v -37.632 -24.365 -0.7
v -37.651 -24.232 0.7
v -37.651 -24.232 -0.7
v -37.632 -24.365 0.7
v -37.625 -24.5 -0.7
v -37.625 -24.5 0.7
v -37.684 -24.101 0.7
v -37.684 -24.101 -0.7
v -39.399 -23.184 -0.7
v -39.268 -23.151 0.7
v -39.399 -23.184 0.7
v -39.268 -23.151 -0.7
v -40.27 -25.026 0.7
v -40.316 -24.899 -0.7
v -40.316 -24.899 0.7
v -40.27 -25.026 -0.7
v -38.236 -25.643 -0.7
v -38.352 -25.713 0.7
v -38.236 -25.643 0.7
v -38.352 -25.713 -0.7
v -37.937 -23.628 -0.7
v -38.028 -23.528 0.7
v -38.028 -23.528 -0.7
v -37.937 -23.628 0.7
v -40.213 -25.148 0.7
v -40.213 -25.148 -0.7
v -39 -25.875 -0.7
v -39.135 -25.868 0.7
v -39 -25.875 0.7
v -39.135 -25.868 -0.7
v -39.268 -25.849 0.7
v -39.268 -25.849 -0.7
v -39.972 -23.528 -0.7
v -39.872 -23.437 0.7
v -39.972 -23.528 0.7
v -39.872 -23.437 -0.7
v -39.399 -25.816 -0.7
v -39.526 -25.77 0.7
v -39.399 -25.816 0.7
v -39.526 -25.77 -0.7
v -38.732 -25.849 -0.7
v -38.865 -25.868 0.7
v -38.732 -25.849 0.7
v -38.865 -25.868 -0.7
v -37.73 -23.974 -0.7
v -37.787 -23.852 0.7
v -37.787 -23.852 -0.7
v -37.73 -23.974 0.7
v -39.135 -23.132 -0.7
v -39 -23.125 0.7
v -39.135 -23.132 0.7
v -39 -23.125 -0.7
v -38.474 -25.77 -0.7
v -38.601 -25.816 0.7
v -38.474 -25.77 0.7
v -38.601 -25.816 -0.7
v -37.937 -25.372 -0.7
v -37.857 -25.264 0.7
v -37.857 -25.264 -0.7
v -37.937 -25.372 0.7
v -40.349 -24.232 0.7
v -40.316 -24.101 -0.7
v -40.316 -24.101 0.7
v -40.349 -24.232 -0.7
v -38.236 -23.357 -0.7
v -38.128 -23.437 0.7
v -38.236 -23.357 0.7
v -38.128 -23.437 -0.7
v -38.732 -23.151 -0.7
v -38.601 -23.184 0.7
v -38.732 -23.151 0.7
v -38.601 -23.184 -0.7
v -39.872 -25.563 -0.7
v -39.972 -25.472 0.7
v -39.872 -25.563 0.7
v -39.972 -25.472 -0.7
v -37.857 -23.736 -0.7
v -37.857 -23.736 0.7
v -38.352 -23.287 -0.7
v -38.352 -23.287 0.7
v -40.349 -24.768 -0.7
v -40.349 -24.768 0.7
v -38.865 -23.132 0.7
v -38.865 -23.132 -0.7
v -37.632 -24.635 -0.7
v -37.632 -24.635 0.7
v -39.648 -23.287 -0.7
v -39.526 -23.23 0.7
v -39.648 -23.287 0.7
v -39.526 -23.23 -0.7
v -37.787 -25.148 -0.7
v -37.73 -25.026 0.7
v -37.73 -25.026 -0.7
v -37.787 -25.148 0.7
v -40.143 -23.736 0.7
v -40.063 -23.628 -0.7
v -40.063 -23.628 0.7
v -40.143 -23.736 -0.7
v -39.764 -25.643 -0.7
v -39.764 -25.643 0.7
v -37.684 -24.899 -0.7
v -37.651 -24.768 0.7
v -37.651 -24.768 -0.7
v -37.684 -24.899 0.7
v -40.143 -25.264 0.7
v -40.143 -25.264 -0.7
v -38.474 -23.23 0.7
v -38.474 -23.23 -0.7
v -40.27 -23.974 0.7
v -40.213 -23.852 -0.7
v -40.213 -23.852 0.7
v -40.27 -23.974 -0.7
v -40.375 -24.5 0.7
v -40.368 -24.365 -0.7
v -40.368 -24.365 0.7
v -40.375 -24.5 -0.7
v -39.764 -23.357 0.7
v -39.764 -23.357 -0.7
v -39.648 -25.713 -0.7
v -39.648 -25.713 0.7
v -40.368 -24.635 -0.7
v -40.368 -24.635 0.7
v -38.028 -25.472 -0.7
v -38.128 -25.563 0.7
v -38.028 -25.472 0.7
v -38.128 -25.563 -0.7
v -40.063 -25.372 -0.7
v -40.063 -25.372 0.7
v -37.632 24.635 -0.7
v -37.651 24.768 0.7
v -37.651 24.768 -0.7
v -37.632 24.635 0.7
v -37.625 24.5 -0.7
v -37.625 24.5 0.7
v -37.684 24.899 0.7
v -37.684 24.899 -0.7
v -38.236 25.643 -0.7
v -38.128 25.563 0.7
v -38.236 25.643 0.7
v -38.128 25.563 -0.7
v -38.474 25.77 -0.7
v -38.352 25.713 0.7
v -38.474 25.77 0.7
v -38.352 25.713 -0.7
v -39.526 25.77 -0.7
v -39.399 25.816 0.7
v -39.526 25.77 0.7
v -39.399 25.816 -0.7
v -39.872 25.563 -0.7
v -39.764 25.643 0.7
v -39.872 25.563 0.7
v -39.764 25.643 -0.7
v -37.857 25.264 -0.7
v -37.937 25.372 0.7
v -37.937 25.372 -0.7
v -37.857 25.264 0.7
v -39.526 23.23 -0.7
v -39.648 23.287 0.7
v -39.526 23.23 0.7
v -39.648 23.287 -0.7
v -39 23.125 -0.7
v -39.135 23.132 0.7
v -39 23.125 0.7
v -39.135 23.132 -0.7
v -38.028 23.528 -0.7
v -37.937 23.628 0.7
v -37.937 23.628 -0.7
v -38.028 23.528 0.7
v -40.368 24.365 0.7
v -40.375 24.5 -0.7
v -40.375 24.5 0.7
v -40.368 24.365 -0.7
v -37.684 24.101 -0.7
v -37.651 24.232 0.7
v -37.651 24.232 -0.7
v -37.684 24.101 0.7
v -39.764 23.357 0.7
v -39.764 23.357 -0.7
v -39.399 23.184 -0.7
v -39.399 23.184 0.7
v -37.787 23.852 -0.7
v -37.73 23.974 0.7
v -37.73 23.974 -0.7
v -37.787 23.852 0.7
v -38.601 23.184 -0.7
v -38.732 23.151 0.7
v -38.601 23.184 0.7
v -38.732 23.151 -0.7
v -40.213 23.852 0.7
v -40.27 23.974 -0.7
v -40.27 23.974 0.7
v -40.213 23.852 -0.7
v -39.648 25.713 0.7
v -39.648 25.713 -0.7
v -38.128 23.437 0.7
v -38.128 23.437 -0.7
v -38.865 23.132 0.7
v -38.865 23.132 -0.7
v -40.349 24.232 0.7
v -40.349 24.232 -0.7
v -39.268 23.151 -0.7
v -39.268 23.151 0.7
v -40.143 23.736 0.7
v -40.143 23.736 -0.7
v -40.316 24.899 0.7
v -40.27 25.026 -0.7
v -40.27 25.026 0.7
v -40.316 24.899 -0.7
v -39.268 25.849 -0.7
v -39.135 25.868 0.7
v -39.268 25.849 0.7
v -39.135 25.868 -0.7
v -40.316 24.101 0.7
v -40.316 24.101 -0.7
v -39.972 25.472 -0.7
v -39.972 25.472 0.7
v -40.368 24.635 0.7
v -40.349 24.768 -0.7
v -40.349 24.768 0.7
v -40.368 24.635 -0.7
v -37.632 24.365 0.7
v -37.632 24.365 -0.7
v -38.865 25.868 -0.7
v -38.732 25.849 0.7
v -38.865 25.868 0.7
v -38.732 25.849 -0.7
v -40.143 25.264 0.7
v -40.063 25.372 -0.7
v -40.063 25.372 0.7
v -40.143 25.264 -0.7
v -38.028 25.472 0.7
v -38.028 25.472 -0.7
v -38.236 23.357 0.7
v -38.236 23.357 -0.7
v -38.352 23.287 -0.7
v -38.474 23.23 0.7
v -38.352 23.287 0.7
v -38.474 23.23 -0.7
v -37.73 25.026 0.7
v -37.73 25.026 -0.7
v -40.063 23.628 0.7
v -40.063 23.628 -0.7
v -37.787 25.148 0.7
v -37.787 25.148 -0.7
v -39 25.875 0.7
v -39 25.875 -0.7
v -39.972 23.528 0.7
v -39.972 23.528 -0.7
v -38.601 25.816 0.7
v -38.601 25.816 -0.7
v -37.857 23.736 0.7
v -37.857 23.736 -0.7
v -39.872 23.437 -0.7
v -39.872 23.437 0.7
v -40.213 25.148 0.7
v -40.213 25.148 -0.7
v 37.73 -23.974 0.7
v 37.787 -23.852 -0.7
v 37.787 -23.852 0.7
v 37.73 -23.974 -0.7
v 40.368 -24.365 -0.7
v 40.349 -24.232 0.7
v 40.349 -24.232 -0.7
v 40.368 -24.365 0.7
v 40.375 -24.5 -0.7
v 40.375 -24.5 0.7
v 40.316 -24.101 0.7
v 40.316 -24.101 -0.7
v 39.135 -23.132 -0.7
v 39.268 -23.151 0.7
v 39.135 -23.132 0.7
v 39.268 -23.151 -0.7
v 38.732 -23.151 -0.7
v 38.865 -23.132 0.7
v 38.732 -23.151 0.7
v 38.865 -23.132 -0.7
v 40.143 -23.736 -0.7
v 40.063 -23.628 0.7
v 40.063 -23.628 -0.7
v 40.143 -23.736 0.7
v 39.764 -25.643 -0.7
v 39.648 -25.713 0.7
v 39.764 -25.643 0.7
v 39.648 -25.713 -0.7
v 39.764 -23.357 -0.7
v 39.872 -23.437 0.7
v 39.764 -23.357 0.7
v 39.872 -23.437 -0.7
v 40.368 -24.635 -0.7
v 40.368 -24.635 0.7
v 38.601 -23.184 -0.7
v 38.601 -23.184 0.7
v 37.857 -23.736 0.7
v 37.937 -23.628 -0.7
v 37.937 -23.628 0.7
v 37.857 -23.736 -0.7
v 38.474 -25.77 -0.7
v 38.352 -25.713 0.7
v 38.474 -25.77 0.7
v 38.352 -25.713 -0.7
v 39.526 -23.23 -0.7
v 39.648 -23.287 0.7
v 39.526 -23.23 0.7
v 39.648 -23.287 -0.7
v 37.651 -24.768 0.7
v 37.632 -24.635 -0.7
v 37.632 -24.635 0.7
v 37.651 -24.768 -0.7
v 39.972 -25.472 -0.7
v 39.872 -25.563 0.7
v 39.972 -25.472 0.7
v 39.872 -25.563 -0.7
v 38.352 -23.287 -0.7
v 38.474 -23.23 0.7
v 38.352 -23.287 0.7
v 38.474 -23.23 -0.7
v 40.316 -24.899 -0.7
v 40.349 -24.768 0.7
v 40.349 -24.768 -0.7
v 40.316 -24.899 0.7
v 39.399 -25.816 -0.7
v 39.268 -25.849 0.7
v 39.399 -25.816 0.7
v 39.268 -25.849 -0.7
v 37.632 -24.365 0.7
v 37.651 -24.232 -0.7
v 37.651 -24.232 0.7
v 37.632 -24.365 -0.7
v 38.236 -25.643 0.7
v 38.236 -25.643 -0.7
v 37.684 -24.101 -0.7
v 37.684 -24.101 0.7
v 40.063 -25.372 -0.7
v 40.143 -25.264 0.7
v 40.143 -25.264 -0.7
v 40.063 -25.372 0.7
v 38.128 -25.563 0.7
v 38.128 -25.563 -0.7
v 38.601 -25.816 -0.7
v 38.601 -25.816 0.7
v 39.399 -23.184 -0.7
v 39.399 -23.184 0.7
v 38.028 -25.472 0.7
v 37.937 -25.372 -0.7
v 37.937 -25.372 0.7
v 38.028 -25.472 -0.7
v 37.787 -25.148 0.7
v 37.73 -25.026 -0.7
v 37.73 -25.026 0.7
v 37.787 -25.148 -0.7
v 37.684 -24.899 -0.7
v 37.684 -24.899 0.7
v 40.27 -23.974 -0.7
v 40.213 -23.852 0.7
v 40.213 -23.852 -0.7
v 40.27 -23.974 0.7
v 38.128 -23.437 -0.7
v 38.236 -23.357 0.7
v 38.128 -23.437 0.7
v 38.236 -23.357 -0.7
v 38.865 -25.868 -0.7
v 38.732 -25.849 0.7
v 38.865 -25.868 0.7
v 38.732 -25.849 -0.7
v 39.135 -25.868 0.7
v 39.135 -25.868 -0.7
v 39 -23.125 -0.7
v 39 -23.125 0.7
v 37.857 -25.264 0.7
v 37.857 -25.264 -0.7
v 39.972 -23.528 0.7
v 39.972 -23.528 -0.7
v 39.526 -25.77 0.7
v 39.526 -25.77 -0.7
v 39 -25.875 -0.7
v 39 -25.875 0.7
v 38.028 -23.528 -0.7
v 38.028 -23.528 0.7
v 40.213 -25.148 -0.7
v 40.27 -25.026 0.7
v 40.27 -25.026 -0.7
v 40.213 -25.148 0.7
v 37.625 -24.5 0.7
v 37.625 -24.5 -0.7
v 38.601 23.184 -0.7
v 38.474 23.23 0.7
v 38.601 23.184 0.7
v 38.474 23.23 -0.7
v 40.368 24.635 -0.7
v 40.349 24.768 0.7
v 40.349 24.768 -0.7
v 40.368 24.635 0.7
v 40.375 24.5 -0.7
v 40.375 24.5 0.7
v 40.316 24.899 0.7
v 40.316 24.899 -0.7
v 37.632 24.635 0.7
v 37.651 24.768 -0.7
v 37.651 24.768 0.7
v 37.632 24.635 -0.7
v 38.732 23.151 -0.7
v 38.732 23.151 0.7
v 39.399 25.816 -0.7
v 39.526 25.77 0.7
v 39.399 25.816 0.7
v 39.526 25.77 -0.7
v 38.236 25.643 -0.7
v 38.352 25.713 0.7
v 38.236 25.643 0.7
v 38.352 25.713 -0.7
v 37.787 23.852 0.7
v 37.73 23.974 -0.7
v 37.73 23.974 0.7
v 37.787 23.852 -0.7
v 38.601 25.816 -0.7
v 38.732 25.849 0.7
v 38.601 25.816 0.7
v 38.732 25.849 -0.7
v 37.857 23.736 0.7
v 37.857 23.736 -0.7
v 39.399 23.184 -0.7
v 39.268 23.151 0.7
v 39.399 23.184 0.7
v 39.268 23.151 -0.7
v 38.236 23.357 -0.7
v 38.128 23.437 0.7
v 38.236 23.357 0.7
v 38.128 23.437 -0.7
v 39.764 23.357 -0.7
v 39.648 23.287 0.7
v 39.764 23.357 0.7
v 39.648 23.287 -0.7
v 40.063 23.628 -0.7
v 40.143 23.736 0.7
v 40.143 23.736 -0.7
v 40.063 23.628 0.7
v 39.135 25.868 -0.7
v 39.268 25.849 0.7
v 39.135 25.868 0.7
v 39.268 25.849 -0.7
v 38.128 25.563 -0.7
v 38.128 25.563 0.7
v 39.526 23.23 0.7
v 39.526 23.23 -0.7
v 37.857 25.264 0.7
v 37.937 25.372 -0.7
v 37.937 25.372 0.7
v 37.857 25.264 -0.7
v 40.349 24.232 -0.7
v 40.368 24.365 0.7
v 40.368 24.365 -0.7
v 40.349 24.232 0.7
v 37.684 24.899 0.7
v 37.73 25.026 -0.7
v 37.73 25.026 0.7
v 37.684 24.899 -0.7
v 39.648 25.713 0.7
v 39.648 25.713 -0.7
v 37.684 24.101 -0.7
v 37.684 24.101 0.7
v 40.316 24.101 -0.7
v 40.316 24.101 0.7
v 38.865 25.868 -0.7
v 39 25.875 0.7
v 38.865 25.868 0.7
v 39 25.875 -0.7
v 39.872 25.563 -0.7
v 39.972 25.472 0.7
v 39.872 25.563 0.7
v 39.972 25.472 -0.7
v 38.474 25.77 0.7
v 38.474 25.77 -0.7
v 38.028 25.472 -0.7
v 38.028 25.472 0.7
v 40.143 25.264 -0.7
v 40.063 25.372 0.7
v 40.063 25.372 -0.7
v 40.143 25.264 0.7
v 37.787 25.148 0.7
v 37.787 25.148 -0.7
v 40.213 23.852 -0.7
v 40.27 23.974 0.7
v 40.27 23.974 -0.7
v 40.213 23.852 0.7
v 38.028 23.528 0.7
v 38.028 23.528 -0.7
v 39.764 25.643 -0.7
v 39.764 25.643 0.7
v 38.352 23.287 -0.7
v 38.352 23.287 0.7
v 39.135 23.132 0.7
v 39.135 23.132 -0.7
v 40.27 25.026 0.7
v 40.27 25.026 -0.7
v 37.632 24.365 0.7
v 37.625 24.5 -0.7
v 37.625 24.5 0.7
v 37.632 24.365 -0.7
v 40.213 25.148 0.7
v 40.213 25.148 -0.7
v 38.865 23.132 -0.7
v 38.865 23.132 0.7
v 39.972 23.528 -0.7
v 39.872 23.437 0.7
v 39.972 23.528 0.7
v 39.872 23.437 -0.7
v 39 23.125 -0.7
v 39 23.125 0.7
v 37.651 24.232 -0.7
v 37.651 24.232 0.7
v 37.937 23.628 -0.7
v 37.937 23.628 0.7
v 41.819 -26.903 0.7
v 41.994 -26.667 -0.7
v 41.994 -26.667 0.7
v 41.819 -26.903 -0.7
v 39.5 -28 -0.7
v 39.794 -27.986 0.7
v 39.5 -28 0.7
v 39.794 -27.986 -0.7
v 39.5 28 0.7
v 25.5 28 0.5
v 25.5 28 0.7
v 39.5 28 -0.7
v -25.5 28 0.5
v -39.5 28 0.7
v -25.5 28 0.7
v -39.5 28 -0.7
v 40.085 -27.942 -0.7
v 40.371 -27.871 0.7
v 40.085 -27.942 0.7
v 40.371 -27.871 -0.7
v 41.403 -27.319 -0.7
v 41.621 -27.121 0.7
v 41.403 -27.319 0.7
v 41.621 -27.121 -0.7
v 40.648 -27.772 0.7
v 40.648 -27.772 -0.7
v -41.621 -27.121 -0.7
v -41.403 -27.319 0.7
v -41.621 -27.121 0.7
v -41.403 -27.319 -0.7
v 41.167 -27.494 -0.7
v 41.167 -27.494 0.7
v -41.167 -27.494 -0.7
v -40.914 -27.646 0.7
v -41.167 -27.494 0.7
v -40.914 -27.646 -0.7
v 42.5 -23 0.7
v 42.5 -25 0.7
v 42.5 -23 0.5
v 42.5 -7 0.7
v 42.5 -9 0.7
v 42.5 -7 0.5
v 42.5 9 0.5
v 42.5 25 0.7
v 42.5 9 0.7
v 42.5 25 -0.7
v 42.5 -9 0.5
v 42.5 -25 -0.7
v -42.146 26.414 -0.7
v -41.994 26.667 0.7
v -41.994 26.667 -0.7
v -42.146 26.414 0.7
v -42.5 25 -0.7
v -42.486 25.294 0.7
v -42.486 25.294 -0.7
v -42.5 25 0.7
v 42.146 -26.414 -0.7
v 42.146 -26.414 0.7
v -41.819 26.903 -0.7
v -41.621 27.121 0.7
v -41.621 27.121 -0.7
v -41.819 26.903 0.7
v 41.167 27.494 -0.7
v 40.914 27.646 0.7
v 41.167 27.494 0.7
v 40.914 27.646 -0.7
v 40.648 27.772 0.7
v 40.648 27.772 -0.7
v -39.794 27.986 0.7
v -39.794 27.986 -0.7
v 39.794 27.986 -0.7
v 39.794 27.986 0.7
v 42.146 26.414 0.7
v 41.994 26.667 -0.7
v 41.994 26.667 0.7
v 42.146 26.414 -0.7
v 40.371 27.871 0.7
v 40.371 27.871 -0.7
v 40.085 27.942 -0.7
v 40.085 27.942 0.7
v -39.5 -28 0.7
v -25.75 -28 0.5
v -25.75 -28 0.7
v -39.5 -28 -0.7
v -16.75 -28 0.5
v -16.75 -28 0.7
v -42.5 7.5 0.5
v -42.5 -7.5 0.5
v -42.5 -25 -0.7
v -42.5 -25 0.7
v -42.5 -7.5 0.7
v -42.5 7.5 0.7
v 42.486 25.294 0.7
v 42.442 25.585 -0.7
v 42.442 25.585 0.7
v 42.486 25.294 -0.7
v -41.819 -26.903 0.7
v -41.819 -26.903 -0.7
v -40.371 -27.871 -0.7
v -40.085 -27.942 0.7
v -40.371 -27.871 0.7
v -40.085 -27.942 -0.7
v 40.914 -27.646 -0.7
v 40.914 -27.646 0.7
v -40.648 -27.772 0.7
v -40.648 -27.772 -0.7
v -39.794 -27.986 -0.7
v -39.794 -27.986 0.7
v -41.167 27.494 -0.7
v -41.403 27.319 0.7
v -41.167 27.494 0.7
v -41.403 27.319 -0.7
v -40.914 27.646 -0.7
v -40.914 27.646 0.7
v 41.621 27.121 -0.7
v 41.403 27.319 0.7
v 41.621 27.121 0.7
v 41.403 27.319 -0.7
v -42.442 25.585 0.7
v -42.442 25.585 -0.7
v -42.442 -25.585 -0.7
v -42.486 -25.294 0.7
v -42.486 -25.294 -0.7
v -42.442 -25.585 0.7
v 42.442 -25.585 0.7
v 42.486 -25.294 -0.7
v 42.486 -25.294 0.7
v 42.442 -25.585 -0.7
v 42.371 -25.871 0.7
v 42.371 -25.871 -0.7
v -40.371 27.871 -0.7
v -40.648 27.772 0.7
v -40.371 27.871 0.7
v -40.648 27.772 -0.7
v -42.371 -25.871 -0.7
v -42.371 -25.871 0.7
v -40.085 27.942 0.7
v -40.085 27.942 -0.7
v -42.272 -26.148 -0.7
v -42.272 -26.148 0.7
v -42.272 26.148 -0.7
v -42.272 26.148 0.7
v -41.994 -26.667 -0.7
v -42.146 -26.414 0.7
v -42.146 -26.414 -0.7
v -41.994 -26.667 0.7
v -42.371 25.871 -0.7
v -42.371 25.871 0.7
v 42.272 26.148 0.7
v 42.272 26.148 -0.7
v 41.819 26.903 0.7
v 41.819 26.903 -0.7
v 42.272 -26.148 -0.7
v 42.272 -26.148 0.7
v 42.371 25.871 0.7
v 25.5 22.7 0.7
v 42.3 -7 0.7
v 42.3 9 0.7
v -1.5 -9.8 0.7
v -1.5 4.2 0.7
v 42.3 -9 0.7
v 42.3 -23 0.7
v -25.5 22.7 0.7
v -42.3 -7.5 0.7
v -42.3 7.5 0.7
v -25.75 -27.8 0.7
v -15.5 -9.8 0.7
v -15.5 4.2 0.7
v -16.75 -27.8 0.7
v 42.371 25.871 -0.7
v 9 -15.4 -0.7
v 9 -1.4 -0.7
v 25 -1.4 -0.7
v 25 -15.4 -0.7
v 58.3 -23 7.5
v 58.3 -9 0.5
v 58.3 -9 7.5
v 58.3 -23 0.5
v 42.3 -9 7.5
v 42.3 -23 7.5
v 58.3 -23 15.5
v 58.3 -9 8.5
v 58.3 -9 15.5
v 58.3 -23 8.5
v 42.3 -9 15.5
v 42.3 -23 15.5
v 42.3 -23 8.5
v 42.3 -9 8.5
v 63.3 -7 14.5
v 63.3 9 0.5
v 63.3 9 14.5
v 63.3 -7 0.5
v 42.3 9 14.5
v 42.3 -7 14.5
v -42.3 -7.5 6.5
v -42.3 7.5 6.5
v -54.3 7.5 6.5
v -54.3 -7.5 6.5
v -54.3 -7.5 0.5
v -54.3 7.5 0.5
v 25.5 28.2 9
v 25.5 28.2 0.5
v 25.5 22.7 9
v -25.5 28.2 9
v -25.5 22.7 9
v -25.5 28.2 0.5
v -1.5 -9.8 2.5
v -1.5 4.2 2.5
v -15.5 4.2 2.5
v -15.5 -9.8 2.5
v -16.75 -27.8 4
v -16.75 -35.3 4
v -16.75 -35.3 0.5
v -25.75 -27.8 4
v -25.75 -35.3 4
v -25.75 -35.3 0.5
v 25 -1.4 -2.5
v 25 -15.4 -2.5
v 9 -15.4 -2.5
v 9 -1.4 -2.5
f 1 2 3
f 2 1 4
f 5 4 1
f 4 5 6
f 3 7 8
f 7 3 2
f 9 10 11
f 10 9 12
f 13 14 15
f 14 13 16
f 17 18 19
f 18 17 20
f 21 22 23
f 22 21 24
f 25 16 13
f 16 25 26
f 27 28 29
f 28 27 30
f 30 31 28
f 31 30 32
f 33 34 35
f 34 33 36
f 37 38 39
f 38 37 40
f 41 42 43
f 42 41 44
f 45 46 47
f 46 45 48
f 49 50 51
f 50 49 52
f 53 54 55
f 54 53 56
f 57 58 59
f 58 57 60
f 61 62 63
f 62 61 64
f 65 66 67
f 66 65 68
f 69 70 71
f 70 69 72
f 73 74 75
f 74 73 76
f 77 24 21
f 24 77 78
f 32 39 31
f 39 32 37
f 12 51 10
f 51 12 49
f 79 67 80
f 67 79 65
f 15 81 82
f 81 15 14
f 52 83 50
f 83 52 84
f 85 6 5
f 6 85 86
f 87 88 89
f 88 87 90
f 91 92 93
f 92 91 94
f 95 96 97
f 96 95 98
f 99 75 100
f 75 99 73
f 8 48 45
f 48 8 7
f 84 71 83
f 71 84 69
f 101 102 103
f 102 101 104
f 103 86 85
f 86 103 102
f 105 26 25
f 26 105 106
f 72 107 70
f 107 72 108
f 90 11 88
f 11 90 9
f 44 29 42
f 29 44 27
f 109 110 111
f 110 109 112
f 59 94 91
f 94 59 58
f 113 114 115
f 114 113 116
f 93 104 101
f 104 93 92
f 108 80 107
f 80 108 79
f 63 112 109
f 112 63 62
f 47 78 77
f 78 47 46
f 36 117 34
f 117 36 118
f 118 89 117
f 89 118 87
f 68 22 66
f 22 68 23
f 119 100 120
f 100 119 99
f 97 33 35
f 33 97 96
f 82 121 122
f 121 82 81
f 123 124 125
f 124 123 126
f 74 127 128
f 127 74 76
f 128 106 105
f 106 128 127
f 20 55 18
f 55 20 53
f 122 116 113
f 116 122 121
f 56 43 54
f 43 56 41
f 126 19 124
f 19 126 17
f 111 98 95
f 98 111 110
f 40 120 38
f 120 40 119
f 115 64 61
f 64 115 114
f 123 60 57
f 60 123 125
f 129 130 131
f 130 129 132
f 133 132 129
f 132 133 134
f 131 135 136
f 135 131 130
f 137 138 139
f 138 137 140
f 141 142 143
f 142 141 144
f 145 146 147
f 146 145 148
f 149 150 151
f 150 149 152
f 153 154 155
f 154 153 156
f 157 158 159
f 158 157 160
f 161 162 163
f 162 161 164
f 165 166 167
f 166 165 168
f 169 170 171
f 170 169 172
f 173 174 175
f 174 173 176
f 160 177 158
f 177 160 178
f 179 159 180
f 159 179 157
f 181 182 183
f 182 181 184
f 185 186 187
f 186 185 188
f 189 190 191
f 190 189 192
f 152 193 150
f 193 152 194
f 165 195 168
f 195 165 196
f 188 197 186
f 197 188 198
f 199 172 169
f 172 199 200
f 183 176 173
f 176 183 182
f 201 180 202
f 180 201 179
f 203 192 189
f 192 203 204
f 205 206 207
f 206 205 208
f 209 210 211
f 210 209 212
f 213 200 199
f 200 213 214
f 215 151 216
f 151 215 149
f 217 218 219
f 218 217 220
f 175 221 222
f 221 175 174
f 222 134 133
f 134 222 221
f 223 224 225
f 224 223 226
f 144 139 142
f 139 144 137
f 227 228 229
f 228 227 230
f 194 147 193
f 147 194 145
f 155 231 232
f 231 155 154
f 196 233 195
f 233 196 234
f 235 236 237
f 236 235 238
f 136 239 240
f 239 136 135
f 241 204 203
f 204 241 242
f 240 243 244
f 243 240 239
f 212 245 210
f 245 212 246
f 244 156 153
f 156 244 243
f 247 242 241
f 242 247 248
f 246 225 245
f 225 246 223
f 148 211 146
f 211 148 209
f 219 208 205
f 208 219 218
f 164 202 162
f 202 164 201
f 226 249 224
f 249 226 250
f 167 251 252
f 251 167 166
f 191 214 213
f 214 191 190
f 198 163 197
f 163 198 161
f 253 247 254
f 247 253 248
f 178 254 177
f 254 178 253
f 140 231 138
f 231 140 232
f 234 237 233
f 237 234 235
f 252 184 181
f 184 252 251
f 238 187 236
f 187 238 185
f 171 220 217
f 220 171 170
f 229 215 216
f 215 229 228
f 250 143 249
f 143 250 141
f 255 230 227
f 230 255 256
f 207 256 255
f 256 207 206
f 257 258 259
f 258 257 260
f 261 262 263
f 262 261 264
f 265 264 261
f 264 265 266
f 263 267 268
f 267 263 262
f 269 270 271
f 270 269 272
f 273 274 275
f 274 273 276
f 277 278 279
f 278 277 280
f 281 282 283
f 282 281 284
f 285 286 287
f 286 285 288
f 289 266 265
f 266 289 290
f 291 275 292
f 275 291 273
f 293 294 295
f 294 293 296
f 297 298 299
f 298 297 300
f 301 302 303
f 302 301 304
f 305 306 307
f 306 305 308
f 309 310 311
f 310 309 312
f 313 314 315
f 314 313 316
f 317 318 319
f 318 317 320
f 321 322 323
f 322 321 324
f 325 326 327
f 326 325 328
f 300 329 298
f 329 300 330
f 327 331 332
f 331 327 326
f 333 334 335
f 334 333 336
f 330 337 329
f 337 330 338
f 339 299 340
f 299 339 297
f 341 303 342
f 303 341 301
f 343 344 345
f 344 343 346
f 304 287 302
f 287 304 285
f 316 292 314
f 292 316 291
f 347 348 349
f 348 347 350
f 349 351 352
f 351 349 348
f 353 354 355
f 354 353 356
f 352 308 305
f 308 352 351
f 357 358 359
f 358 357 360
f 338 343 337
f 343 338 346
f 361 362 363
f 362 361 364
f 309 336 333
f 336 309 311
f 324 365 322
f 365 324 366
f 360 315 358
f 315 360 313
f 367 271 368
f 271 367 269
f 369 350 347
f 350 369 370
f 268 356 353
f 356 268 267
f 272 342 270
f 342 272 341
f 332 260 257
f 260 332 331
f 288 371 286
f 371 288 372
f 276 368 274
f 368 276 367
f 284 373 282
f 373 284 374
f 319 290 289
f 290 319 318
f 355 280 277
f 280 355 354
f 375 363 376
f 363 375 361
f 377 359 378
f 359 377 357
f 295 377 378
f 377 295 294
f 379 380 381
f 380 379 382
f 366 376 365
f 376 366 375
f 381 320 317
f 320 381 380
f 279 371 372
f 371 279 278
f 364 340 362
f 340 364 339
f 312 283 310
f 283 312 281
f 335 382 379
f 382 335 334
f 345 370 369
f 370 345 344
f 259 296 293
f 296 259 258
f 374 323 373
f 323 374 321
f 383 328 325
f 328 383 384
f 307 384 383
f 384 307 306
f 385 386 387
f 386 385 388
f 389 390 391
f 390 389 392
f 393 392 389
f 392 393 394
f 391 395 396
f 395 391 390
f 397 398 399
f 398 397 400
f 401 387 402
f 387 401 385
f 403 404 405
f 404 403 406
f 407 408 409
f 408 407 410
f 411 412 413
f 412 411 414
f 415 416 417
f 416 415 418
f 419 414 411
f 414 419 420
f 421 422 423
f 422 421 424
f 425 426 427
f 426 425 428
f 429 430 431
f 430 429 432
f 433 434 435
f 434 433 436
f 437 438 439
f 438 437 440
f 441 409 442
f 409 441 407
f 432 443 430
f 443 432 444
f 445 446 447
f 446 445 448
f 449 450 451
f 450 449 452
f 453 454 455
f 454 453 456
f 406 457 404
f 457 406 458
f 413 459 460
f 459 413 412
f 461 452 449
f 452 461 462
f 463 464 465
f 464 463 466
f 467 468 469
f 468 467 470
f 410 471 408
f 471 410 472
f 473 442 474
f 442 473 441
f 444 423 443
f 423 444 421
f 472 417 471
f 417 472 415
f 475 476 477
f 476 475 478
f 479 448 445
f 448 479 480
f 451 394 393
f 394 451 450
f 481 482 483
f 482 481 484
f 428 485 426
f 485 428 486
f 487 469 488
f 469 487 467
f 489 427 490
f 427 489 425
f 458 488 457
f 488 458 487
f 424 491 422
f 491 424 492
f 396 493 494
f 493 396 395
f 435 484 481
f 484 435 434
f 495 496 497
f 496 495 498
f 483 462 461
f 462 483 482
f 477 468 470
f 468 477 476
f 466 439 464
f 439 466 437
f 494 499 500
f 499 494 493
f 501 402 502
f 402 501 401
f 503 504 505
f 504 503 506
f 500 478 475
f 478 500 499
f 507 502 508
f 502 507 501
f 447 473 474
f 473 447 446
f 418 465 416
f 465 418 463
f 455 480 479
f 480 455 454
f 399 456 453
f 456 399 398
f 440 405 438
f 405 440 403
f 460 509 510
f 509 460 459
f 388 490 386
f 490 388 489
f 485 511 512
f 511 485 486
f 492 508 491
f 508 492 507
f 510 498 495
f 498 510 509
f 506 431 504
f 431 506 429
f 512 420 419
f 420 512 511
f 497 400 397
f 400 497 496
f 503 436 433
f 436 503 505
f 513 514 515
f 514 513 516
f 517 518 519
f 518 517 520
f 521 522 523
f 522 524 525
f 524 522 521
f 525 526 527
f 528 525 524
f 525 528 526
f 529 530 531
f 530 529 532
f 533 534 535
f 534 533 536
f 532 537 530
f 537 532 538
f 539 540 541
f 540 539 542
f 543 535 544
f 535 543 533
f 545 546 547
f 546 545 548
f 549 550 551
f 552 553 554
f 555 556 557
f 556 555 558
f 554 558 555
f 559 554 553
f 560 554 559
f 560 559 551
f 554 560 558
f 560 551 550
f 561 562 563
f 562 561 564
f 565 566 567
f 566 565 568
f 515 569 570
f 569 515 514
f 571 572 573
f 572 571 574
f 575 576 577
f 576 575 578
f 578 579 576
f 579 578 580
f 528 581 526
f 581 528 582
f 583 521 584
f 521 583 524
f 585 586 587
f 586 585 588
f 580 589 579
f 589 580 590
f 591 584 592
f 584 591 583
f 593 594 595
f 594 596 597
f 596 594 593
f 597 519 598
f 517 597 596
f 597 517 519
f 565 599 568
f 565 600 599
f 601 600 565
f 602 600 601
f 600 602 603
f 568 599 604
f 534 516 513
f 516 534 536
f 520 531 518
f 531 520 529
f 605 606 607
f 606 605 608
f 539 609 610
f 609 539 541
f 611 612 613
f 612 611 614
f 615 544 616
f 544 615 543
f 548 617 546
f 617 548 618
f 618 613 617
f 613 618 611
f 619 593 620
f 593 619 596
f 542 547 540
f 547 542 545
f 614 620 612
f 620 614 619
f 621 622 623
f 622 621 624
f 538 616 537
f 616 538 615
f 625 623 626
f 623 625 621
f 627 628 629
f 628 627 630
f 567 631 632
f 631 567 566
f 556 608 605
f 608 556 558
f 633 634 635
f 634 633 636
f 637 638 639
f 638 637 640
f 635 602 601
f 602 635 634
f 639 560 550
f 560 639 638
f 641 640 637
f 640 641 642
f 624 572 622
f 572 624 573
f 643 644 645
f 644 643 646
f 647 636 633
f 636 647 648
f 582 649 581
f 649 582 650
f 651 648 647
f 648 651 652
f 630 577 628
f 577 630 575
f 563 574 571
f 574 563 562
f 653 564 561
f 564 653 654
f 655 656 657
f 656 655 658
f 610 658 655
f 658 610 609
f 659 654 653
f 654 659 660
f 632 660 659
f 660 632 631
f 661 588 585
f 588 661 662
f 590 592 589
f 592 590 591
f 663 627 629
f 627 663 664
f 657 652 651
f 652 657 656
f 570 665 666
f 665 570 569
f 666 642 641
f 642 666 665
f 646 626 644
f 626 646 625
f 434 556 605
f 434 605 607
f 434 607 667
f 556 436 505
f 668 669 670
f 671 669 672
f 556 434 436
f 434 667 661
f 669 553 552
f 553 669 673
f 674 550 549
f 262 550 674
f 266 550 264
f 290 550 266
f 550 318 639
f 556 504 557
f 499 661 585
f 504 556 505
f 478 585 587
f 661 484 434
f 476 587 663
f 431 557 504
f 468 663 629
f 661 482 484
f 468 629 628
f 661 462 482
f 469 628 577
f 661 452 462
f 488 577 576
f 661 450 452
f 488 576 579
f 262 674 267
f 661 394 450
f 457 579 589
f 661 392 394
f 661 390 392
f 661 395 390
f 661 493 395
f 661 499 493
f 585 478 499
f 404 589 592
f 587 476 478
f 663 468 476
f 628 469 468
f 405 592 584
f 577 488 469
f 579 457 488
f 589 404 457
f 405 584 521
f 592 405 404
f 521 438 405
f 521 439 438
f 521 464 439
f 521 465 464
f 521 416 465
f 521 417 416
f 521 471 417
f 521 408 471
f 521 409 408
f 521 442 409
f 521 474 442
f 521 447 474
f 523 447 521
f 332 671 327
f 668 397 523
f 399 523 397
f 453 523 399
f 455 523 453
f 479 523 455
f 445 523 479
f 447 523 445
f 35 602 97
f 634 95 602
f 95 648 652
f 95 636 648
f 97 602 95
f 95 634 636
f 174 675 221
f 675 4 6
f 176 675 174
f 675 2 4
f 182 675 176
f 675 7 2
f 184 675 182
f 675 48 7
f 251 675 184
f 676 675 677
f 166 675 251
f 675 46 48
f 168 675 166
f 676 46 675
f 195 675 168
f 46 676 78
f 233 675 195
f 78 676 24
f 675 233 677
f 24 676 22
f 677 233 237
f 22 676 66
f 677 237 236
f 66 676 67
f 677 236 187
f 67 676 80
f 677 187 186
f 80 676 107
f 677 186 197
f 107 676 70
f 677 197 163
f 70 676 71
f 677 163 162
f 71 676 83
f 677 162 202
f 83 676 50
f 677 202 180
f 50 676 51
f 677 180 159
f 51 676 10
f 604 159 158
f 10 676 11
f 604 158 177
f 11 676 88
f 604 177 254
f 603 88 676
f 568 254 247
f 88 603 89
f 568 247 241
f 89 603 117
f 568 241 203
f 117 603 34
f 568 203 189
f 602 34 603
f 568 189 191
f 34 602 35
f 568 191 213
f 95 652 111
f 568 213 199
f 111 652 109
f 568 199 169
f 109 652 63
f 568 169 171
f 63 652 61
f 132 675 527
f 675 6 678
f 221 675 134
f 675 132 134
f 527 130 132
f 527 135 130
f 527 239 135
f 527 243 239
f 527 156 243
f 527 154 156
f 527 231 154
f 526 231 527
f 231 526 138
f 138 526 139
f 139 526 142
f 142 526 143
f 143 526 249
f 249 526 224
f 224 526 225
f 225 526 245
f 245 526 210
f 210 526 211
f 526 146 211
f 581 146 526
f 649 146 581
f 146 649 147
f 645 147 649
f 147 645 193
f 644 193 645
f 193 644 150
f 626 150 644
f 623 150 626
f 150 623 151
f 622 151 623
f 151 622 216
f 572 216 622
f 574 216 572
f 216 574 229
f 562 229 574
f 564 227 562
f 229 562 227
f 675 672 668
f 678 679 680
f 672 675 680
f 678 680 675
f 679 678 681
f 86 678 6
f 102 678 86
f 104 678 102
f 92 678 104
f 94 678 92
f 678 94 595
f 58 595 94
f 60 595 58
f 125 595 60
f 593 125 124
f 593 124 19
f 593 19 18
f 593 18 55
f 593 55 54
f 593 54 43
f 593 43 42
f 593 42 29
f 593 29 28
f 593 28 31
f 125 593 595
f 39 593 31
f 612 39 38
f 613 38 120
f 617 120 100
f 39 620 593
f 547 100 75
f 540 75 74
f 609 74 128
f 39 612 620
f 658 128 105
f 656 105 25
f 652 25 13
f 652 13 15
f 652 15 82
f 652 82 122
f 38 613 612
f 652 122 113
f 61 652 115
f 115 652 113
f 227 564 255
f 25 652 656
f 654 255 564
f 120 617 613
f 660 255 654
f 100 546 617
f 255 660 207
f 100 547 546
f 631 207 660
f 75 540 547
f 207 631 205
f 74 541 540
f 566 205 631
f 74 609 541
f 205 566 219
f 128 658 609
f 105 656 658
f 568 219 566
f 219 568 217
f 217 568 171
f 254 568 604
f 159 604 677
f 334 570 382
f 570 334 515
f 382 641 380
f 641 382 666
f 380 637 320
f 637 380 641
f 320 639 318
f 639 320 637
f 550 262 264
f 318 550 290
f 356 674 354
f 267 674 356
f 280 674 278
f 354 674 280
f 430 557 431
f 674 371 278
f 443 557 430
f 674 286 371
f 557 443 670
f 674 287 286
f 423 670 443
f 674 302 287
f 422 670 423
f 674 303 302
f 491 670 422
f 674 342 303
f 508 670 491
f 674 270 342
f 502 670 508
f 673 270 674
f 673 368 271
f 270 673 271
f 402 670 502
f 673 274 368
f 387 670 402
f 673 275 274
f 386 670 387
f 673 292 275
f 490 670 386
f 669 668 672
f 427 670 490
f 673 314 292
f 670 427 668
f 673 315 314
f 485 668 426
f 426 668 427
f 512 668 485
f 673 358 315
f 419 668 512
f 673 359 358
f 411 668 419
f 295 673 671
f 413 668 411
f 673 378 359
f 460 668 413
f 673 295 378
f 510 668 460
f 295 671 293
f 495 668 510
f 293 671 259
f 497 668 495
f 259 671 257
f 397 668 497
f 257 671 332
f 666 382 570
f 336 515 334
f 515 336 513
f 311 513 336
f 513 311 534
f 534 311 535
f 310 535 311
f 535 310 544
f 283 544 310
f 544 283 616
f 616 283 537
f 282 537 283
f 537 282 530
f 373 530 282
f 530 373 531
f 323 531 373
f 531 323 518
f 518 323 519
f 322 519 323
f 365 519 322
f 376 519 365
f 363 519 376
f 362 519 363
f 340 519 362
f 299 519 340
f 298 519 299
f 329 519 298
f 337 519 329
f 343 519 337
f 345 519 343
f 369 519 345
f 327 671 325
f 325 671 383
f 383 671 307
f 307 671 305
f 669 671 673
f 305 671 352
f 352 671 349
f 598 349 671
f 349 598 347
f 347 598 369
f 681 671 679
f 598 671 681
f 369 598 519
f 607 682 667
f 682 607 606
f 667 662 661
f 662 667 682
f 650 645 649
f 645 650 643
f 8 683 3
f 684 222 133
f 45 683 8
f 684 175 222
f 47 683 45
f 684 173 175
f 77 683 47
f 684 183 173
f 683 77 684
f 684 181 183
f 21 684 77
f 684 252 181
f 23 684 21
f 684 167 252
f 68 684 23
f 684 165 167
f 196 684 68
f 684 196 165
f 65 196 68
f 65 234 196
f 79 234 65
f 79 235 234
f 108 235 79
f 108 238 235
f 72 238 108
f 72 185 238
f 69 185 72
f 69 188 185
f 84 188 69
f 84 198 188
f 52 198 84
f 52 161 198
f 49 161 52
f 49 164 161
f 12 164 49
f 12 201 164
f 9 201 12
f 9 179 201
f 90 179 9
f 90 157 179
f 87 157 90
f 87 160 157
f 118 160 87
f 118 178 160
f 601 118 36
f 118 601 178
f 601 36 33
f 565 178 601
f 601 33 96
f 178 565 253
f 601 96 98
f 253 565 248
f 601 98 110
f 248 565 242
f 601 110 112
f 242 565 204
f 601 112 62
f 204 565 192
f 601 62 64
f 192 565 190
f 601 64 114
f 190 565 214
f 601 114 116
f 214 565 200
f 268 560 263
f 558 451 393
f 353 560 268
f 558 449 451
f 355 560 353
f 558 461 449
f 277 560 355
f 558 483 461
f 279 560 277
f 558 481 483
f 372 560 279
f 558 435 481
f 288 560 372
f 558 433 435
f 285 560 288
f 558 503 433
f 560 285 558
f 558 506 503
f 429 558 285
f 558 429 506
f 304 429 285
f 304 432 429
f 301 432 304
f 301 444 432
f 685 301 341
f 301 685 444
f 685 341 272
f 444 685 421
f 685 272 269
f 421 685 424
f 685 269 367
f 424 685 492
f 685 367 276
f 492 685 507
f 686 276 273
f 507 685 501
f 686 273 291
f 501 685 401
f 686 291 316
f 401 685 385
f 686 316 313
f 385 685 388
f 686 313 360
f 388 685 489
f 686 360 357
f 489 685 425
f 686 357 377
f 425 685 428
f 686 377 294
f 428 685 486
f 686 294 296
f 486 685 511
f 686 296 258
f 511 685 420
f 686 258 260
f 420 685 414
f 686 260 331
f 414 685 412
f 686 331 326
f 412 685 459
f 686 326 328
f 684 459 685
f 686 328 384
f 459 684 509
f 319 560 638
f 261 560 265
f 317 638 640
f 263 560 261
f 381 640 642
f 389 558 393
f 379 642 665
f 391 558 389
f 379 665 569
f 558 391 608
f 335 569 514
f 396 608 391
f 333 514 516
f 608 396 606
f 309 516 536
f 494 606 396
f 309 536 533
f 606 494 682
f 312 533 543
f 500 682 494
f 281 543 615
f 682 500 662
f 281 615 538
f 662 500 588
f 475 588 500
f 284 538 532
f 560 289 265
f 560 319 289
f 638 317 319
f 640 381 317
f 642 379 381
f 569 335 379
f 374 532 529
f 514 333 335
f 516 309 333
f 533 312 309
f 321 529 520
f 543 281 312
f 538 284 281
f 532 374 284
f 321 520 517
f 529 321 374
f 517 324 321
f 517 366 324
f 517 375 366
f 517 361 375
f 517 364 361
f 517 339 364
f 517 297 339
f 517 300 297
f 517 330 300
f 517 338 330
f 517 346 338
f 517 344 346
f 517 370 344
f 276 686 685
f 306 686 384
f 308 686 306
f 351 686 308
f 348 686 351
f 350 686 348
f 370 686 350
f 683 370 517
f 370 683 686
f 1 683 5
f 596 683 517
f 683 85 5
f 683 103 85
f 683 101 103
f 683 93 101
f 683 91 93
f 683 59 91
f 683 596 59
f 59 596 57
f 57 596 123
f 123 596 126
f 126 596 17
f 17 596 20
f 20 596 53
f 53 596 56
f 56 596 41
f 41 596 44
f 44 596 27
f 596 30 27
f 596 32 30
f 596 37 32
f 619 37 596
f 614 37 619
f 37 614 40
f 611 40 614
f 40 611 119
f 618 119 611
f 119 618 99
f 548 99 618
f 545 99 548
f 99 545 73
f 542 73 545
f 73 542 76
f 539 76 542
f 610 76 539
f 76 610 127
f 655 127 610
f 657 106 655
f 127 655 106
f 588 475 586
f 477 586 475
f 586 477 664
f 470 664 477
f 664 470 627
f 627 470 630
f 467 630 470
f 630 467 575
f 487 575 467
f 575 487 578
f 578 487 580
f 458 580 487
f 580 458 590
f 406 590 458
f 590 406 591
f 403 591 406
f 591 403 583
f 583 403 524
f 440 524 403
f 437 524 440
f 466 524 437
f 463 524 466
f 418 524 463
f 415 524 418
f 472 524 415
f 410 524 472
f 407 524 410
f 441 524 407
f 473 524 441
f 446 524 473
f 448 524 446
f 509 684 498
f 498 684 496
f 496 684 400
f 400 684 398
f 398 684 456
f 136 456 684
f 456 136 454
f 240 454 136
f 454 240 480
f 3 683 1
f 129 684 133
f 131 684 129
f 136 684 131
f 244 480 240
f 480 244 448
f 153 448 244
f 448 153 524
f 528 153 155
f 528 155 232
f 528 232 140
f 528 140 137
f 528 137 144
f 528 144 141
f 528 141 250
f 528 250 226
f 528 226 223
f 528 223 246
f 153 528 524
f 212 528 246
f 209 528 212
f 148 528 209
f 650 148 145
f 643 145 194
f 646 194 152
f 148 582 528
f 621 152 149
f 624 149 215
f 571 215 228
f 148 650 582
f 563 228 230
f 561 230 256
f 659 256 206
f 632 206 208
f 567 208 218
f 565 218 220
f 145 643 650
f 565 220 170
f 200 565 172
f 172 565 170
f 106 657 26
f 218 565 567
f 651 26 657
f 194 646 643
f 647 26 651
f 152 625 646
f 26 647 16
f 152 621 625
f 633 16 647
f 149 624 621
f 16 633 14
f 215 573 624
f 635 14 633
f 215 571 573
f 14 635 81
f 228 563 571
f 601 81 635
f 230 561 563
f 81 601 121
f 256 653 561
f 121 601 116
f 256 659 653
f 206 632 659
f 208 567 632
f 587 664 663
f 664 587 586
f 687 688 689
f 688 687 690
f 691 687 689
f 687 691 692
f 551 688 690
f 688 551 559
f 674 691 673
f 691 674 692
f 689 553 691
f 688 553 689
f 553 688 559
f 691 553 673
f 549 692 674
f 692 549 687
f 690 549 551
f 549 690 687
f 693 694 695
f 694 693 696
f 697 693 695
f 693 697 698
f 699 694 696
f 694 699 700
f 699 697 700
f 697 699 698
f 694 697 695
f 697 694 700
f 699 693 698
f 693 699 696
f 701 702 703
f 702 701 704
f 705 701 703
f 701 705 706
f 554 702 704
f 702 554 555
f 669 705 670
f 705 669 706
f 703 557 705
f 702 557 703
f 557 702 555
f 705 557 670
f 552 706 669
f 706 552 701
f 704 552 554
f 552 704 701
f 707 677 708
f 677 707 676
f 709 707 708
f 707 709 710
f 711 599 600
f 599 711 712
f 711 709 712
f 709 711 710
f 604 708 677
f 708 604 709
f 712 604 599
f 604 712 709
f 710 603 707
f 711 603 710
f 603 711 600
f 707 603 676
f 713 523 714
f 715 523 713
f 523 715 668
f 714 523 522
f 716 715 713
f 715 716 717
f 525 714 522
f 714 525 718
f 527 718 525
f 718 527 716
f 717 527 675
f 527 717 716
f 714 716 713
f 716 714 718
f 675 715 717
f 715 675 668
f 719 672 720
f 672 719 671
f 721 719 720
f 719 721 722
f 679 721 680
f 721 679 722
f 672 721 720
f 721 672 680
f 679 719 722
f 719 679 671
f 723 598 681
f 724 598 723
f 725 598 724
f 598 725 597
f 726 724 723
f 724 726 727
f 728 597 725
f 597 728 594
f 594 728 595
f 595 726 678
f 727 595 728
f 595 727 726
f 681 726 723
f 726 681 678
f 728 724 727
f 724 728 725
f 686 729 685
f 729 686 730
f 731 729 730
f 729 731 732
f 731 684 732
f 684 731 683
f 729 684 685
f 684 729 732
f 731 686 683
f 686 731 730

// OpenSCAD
$fn = 64;

// Target PCB dimensions
pcb_length = 85.0;
pcb_width  = 56.0;
pcb_thickness = 1.4;

// Small overlap to guarantee watertight unions
overlap = 0.2;

// ---------- Helpers ----------
module rounded_plate(L, W, H, r) {
    // Rounded rectangle prism using hull of corner cylinders
    hull() {
        for (sx = [-1, 1], sy = [-1, 1])
            translate([sx*(L/2 - r), sy*(W/2 - r), 0])
                cylinder(r=r, h=H, center=true);
    }
}

module box_solid(L, W, H) {
    cube([L, W, H], center=true);
}

// ---------- SBC Model ----------
module single_board_computer() {

    // PCB with rounded corners + mounting holes (holes are cut through PCB only)
    hole_d = 2.75;
    hole_r = hole_d/2;
    hole_edge = 3.5; // distance from each edge to hole center (typical SBC)
    hole_x = pcb_length/2 - hole_edge;
    hole_y = pcb_width/2  - hole_edge;

    pcb_corner_r = 3.0;

    difference() {
        rounded_plate(pcb_length, pcb_width, pcb_thickness, pcb_corner_r);

        // Mounting holes
        for (sx = [-1, 1], sy = [-1, 1])
            translate([sx*hole_x, sy*hole_y, 0])
                cylinder(r=hole_r, h=pcb_thickness + 1, center=true);
    }

    // Components (all UNIONED and CONNECTED to PCB with slight overlap)

    // USB-A stack (2 ports) on one long edge
    usb_w = 14.0;   // along Y
    usb_d = 16.0;   // protrusion along X
    usb_h = 15.0;   // height above PCB
    usb_stack_gap = 1.0;
    usb_single_h = (usb_h - usb_stack_gap)/2;

    usb_xc = pcb_length/2 + usb_d/2 - overlap; // connected to +X edge
    usb_yc = -pcb_width/2 + 12.0;              // placed near one corner (formula from width)
    usb_zc1 = pcb_thickness/2 + usb_single_h/2 - overlap;
    usb_zc2 = pcb_thickness/2 + usb_single_h + usb_stack_gap + usb_single_h/2 - overlap;

    translate([usb_xc, usb_yc, usb_zc1]) box_solid(usb_d, usb_w, usb_single_h);
    translate([usb_xc, usb_yc, usb_zc2]) box_solid(usb_d, usb_w, usb_single_h);

    // Ethernet (RJ45) next to USB on same edge
    eth_w = 16.0;
    eth_d = 21.0;
    eth_h = 14.0;

    eth_xc = pcb_length/2 + eth_d/2 - overlap;
    eth_yc = usb_yc + (usb_w/2 + eth_w/2 + 2.0); // adjacent with 2mm gap
    eth_zc = pcb_thickness/2 + eth_h/2 - overlap;

    translate([eth_xc, eth_yc, eth_zc]) box_solid(eth_d, eth_w, eth_h);

    // HDMI on opposite long edge (-X)
    hdmi_w = 15.0;
    hdmi_d = 12.0;
    hdmi_h = 6.0;

    hdmi_xc = -pcb_length/2 - hdmi_d/2 + overlap; // connected to -X edge
    hdmi_yc = 0;
    hdmi_zc = pcb_thickness/2 + hdmi_h/2 - overlap;

    translate([hdmi_xc, hdmi_yc, hdmi_zc]) box_solid(hdmi_d, hdmi_w, hdmi_h);

    // 40-pin header along one long side (+Y), on top of PCB
    hdr_len = 51.0; // along X
    hdr_w   = 5.5;  // along Y
    hdr_h   = 8.5;  // height

    hdr_xc = 0;
    hdr_yc = pcb_width/2 - hdr_w/2 + overlap; // connected to +Y edge
    hdr_zc = pcb_thickness/2 + hdr_h/2 - overlap;

    translate([hdr_xc, hdr_yc, hdr_zc]) box_solid(hdr_len, hdr_w, hdr_h);

    // Main SoC chip near center
    soc_L = 14.0;
    soc_W = 14.0;
    soc_H = 2.0;

    soc_xc = -pcb_length*0.10;
    soc_yc = -pcb_width*0.05;
    soc_zc = pcb_thickness/2 + soc_H/2 - overlap;

    translate([soc_xc, soc_yc, soc_zc]) box_solid(soc_L, soc_W, soc_H);

    // USB-C / power connector on short edge (-Y)
    pwr_w = 9.0;   // along X
    pwr_d = 7.5;   // protrusion along Y
    pwr_h = 3.5;

    pwr_xc = -pcb_length*0.25;
    pwr_yc = -pcb_width/2 - pwr_d/2 + overlap; // connected to -Y edge
    pwr_zc = pcb_thickness/2 + pwr_h/2 - overlap;

    translate([pwr_xc, pwr_yc, pwr_zc]) box_solid(pwr_w, pwr_d, pwr_h);

    // MicroSD slot on bottom side (still connected as one solid by overlapping into PCB)
    sd_L = 16.0; // along X
    sd_W = 14.0; // along Y
    sd_H = 2.0;  // thickness below PCB

    sd_xc = pcb_length*0.20;
    sd_yc = -pcb_width*0.15;
    sd_zc = -pcb_thickness/2 - sd_H/2 + overlap; // overlaps into PCB to keep single solid

    translate([sd_xc, sd_yc, sd_zc]) box_solid(sd_L, sd_W, sd_H);
}

// Render as one connected solid (PCB with holes + attached components)
union() {
    single_board_computer();
}
